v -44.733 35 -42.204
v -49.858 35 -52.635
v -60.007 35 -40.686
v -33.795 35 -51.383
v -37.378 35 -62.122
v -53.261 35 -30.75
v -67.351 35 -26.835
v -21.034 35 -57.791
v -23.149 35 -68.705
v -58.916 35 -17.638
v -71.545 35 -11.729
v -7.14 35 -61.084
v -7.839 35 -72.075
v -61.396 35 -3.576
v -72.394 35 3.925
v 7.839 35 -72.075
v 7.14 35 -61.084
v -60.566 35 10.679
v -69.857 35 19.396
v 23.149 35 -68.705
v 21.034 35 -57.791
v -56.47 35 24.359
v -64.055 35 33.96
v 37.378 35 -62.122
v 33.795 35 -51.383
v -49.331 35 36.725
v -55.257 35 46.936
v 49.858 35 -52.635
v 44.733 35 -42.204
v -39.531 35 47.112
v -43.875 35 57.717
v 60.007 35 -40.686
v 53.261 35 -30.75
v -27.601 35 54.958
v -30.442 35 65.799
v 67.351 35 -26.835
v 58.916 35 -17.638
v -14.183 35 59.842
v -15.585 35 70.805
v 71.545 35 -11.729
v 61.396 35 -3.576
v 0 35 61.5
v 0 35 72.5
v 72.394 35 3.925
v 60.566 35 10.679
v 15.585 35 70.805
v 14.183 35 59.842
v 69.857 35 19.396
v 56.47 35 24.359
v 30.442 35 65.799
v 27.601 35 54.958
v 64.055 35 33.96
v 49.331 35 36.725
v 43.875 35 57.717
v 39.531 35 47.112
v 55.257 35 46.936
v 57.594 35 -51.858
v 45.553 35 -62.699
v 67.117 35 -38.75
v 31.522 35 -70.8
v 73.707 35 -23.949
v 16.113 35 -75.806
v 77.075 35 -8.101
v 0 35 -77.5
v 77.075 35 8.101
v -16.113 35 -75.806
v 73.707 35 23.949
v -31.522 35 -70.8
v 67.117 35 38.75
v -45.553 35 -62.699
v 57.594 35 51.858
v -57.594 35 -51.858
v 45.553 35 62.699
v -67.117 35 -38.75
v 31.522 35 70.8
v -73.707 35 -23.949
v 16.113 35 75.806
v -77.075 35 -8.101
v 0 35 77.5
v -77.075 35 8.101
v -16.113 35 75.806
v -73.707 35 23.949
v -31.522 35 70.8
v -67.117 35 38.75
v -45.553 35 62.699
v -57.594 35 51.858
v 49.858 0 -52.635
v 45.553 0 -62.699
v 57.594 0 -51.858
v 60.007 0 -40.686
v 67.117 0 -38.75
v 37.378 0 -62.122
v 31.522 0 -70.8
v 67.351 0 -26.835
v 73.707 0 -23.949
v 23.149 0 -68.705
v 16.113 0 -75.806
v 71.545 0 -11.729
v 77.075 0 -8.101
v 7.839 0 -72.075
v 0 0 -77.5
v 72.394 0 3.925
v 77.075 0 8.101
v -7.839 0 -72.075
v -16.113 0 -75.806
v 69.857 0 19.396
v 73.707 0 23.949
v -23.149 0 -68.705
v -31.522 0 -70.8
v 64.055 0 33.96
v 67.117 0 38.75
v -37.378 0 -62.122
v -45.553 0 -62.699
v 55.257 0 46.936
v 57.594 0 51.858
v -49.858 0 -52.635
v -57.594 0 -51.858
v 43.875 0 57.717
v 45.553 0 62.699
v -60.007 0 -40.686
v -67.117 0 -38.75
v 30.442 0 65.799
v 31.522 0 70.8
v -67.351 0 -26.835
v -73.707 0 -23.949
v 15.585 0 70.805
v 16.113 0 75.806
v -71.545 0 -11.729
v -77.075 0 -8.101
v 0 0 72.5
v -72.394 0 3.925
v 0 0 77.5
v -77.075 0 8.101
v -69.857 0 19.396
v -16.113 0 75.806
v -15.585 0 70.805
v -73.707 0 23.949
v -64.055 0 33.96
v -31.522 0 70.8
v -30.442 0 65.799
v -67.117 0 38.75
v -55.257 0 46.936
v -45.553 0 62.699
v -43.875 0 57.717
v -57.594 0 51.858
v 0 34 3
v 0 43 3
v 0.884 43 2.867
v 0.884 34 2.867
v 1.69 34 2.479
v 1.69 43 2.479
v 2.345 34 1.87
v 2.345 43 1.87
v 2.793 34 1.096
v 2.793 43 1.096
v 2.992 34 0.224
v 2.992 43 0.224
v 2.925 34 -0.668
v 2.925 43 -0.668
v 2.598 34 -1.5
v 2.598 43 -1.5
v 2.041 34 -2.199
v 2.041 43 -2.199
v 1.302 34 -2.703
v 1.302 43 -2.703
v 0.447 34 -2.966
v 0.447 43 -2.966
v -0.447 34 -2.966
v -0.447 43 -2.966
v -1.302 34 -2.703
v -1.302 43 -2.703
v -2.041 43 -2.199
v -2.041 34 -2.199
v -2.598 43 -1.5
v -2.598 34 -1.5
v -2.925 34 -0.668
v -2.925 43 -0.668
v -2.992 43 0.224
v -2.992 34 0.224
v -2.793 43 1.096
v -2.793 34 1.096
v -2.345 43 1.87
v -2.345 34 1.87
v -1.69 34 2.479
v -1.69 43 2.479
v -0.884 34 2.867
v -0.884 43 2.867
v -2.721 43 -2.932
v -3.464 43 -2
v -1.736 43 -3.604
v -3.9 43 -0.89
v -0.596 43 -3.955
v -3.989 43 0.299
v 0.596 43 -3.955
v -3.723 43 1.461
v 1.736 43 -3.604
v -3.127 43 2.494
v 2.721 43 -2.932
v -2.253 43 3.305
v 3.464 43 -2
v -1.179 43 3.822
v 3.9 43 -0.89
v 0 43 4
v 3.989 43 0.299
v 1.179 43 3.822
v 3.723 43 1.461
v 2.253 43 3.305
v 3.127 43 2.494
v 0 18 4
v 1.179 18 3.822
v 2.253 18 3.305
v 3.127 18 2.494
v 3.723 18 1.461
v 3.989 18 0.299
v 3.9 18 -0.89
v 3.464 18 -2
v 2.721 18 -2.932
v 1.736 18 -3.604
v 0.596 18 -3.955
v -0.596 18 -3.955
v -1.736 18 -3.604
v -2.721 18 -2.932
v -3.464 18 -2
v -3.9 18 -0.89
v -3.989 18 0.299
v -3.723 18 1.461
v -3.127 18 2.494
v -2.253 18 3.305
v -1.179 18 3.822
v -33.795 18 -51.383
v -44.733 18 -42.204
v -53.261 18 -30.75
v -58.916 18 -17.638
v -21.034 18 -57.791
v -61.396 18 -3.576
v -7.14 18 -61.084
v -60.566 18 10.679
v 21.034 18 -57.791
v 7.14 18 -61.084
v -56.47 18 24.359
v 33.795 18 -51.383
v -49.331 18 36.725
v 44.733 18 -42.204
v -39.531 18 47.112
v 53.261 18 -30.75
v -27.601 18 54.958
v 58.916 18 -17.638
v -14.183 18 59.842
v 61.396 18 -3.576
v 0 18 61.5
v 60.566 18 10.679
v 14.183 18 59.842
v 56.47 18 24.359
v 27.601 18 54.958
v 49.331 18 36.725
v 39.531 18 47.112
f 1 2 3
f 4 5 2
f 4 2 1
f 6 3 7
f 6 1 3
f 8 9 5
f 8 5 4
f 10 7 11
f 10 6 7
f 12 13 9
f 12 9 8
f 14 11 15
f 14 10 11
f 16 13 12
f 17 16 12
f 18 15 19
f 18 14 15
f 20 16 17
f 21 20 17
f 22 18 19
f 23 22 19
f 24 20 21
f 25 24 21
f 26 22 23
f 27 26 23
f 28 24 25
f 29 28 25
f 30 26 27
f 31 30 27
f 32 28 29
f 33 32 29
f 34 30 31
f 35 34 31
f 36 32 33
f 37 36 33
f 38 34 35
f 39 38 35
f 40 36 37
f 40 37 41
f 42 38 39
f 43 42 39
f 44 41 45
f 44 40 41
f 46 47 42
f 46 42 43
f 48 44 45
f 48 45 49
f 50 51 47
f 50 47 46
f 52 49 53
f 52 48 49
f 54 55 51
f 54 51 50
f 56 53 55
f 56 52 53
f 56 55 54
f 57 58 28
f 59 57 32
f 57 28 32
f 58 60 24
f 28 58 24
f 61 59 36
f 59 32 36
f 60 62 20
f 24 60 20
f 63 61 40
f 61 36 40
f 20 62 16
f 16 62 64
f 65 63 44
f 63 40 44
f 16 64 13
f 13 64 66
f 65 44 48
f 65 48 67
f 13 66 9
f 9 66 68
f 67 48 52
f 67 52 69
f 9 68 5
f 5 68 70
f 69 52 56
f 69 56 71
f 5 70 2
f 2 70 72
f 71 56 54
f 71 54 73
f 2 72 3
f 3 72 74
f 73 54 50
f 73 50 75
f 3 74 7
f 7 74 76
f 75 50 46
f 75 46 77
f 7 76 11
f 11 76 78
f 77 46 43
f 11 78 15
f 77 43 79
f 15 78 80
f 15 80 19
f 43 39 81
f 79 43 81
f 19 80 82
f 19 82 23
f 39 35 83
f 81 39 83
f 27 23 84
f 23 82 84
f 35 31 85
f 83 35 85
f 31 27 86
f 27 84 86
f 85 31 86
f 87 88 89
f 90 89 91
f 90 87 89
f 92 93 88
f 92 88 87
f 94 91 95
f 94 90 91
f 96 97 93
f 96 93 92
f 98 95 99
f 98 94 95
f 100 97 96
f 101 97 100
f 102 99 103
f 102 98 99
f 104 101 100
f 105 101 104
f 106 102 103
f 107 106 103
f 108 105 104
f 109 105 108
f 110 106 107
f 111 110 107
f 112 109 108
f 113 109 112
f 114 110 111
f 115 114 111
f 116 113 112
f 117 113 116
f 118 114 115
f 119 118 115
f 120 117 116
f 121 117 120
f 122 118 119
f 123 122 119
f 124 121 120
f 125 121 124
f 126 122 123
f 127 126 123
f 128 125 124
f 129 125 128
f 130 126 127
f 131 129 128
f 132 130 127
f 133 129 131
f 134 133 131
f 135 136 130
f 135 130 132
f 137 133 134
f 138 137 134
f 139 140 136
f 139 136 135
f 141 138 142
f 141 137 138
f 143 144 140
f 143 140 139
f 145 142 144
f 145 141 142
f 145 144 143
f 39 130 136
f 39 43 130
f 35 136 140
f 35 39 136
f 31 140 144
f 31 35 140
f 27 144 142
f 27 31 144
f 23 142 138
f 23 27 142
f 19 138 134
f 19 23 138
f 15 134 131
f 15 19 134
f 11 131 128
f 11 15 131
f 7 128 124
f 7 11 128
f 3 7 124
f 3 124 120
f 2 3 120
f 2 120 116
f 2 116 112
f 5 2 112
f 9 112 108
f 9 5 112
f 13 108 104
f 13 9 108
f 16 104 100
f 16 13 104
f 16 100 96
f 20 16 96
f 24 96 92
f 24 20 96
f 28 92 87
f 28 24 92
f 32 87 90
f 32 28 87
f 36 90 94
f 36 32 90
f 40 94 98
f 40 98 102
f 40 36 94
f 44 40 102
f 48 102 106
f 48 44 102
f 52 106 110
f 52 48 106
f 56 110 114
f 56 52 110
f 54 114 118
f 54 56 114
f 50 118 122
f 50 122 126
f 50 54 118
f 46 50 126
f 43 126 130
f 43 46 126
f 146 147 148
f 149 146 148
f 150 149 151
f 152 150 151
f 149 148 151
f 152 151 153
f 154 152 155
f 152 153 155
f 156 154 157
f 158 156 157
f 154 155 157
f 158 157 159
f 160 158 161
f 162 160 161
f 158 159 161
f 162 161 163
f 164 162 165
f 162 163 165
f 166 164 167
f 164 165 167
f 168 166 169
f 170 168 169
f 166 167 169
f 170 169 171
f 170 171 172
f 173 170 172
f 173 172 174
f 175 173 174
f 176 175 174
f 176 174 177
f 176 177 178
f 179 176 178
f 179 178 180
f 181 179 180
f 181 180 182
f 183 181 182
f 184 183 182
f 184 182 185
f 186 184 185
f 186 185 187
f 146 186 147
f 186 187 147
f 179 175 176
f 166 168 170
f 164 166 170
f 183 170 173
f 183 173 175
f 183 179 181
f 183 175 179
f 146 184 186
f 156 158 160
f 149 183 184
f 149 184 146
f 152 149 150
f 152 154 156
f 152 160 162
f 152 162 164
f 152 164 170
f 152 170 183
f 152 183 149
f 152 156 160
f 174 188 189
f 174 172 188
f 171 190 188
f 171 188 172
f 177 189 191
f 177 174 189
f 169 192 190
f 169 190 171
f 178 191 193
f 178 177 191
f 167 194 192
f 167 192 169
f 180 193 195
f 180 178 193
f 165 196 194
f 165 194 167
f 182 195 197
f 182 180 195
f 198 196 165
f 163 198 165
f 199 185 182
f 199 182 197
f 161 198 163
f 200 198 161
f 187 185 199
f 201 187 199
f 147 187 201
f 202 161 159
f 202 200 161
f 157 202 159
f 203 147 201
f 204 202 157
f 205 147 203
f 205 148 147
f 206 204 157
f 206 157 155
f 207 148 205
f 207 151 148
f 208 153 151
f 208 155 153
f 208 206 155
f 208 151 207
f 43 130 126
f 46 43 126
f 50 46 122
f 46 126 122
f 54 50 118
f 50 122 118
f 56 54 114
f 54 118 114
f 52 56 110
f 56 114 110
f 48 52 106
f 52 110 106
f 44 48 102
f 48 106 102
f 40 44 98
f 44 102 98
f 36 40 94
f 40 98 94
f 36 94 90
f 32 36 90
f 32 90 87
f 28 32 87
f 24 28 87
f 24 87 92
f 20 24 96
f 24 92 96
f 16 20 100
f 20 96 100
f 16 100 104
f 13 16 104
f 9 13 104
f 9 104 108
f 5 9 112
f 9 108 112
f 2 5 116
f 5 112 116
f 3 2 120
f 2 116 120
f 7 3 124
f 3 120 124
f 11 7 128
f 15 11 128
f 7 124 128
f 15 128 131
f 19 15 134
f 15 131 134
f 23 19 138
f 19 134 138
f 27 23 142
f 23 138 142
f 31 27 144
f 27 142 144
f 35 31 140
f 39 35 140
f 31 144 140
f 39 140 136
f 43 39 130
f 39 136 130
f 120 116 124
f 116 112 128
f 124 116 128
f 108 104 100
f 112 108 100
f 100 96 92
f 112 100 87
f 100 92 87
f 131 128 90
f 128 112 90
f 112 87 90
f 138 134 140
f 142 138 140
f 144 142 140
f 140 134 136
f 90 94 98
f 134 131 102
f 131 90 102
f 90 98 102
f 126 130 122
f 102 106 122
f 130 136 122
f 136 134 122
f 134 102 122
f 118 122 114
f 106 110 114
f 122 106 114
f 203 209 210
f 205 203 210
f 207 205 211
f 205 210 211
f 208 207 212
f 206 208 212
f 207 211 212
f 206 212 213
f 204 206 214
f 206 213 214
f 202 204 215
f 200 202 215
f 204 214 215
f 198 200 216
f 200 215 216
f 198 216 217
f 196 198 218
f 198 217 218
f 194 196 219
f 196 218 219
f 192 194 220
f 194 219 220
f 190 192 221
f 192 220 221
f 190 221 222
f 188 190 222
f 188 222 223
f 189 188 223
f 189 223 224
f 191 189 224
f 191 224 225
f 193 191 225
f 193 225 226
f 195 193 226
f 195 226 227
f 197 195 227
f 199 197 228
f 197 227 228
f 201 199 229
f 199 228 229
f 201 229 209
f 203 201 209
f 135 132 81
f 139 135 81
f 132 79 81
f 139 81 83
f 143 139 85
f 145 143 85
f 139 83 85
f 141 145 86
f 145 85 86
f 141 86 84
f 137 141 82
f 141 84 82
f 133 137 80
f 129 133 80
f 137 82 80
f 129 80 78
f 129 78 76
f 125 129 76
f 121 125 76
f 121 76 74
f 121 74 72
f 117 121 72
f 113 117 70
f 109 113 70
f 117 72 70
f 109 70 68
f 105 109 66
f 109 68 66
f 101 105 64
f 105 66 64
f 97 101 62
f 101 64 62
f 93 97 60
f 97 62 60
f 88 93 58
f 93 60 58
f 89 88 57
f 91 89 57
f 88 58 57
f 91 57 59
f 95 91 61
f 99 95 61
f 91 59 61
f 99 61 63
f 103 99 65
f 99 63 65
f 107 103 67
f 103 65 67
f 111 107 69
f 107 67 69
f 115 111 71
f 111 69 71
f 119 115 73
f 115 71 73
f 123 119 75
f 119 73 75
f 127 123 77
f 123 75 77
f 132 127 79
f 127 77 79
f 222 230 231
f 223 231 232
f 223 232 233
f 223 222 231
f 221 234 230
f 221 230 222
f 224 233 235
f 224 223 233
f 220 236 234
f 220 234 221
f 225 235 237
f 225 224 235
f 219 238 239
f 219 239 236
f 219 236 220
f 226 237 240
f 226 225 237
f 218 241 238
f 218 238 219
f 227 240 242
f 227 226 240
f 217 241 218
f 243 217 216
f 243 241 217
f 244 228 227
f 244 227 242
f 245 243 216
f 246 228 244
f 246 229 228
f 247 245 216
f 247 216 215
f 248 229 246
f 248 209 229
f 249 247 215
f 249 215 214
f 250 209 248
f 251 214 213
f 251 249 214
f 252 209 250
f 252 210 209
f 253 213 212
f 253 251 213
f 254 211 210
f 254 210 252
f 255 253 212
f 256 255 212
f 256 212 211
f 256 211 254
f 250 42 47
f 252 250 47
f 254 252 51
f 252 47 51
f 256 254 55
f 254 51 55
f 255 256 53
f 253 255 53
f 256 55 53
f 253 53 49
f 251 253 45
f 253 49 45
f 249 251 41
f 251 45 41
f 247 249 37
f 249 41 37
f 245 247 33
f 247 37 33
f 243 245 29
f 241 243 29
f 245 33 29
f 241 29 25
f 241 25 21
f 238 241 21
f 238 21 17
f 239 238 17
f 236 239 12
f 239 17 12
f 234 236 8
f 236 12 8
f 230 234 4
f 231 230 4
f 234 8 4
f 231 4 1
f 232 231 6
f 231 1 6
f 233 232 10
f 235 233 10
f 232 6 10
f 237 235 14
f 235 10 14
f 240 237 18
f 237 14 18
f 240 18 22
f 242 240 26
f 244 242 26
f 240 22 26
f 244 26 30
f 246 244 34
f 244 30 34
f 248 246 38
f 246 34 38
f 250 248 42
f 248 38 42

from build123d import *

# Parameters (mm, degrees)
SKETCH1_R           = 72.5
BOSS_EXTRUDE1_DEPTH = 35
SKETCH2_R           = 61.5
CUT_EXTRUDE2_DEPTH  = 17
SKETCH4_R           = 4
BOSS_EXTRUDE2_DEPTH = 25
SKETCH5_R           = 3
CUT_EXTRUDE4_DEPTH  = 9
SKETCH8_W           = 5
SKETCH8_H           = 35


with BuildPart() as part:
    # Sketch1 → Boss-Extrude1 (new body)
    with BuildSketch(Plane(origin=(0, 0, 0), x_dir=(1, 0, 0), z_dir=(0, 1, 0))):
        with Locations(Location((0, 0, 0), (0, 0, 270))):
            Circle(SKETCH1_R)
    extrude(amount=BOSS_EXTRUDE1_DEPTH)

    # Sketch2 → Cut-Extrude2 (cut)
    with BuildSketch(Plane(origin=(0, 35, 0), x_dir=(1, 0, 0), z_dir=(0, 1, 0))):
        with Locations(Location((0, 0, 0), (0, 0, 270))):
            Circle(SKETCH2_R)
    extrude(amount=-CUT_EXTRUDE2_DEPTH, mode=Mode.SUBTRACT)

    # Sketch4 → Boss-Extrude2 (add)
    with BuildSketch(Plane(origin=(0, 18, 0), x_dir=(1, 0, 0), z_dir=(0, 1, 0))):
        with Locations(Location((0, 0, 0), (0, 0, 270))):
            Circle(SKETCH4_R)
    extrude(amount=BOSS_EXTRUDE2_DEPTH)

    # Sketch5 → Cut-Extrude4 (cut)
    with BuildSketch(Plane(origin=(0, 43, 0), x_dir=(1, 0, 0), z_dir=(0, 1, 0))):
        with Locations(Location((0, 0, 0), (0, 0, 270))):
            Circle(SKETCH5_R)
    extrude(amount=-CUT_EXTRUDE4_DEPTH, mode=Mode.SUBTRACT)


with BuildPart() as body_2:
    # Sketch8 → Revolve1 (revolve)
    with BuildSketch(Plane.XY, mode=Mode.PRIVATE) as revolve1_sk:
        with Locations((-75, 17.5)):
            Rectangle(SKETCH8_W, SKETCH8_H)
    revolve(revolve1_sk.sketch.rotate(Axis((0, 40.543459587, 0), (0, -1, 0)), 270), axis=Axis((0, 40.543459587, 0), (0, -1, 0)))


solid = Compound([part.part, body_2.part])
